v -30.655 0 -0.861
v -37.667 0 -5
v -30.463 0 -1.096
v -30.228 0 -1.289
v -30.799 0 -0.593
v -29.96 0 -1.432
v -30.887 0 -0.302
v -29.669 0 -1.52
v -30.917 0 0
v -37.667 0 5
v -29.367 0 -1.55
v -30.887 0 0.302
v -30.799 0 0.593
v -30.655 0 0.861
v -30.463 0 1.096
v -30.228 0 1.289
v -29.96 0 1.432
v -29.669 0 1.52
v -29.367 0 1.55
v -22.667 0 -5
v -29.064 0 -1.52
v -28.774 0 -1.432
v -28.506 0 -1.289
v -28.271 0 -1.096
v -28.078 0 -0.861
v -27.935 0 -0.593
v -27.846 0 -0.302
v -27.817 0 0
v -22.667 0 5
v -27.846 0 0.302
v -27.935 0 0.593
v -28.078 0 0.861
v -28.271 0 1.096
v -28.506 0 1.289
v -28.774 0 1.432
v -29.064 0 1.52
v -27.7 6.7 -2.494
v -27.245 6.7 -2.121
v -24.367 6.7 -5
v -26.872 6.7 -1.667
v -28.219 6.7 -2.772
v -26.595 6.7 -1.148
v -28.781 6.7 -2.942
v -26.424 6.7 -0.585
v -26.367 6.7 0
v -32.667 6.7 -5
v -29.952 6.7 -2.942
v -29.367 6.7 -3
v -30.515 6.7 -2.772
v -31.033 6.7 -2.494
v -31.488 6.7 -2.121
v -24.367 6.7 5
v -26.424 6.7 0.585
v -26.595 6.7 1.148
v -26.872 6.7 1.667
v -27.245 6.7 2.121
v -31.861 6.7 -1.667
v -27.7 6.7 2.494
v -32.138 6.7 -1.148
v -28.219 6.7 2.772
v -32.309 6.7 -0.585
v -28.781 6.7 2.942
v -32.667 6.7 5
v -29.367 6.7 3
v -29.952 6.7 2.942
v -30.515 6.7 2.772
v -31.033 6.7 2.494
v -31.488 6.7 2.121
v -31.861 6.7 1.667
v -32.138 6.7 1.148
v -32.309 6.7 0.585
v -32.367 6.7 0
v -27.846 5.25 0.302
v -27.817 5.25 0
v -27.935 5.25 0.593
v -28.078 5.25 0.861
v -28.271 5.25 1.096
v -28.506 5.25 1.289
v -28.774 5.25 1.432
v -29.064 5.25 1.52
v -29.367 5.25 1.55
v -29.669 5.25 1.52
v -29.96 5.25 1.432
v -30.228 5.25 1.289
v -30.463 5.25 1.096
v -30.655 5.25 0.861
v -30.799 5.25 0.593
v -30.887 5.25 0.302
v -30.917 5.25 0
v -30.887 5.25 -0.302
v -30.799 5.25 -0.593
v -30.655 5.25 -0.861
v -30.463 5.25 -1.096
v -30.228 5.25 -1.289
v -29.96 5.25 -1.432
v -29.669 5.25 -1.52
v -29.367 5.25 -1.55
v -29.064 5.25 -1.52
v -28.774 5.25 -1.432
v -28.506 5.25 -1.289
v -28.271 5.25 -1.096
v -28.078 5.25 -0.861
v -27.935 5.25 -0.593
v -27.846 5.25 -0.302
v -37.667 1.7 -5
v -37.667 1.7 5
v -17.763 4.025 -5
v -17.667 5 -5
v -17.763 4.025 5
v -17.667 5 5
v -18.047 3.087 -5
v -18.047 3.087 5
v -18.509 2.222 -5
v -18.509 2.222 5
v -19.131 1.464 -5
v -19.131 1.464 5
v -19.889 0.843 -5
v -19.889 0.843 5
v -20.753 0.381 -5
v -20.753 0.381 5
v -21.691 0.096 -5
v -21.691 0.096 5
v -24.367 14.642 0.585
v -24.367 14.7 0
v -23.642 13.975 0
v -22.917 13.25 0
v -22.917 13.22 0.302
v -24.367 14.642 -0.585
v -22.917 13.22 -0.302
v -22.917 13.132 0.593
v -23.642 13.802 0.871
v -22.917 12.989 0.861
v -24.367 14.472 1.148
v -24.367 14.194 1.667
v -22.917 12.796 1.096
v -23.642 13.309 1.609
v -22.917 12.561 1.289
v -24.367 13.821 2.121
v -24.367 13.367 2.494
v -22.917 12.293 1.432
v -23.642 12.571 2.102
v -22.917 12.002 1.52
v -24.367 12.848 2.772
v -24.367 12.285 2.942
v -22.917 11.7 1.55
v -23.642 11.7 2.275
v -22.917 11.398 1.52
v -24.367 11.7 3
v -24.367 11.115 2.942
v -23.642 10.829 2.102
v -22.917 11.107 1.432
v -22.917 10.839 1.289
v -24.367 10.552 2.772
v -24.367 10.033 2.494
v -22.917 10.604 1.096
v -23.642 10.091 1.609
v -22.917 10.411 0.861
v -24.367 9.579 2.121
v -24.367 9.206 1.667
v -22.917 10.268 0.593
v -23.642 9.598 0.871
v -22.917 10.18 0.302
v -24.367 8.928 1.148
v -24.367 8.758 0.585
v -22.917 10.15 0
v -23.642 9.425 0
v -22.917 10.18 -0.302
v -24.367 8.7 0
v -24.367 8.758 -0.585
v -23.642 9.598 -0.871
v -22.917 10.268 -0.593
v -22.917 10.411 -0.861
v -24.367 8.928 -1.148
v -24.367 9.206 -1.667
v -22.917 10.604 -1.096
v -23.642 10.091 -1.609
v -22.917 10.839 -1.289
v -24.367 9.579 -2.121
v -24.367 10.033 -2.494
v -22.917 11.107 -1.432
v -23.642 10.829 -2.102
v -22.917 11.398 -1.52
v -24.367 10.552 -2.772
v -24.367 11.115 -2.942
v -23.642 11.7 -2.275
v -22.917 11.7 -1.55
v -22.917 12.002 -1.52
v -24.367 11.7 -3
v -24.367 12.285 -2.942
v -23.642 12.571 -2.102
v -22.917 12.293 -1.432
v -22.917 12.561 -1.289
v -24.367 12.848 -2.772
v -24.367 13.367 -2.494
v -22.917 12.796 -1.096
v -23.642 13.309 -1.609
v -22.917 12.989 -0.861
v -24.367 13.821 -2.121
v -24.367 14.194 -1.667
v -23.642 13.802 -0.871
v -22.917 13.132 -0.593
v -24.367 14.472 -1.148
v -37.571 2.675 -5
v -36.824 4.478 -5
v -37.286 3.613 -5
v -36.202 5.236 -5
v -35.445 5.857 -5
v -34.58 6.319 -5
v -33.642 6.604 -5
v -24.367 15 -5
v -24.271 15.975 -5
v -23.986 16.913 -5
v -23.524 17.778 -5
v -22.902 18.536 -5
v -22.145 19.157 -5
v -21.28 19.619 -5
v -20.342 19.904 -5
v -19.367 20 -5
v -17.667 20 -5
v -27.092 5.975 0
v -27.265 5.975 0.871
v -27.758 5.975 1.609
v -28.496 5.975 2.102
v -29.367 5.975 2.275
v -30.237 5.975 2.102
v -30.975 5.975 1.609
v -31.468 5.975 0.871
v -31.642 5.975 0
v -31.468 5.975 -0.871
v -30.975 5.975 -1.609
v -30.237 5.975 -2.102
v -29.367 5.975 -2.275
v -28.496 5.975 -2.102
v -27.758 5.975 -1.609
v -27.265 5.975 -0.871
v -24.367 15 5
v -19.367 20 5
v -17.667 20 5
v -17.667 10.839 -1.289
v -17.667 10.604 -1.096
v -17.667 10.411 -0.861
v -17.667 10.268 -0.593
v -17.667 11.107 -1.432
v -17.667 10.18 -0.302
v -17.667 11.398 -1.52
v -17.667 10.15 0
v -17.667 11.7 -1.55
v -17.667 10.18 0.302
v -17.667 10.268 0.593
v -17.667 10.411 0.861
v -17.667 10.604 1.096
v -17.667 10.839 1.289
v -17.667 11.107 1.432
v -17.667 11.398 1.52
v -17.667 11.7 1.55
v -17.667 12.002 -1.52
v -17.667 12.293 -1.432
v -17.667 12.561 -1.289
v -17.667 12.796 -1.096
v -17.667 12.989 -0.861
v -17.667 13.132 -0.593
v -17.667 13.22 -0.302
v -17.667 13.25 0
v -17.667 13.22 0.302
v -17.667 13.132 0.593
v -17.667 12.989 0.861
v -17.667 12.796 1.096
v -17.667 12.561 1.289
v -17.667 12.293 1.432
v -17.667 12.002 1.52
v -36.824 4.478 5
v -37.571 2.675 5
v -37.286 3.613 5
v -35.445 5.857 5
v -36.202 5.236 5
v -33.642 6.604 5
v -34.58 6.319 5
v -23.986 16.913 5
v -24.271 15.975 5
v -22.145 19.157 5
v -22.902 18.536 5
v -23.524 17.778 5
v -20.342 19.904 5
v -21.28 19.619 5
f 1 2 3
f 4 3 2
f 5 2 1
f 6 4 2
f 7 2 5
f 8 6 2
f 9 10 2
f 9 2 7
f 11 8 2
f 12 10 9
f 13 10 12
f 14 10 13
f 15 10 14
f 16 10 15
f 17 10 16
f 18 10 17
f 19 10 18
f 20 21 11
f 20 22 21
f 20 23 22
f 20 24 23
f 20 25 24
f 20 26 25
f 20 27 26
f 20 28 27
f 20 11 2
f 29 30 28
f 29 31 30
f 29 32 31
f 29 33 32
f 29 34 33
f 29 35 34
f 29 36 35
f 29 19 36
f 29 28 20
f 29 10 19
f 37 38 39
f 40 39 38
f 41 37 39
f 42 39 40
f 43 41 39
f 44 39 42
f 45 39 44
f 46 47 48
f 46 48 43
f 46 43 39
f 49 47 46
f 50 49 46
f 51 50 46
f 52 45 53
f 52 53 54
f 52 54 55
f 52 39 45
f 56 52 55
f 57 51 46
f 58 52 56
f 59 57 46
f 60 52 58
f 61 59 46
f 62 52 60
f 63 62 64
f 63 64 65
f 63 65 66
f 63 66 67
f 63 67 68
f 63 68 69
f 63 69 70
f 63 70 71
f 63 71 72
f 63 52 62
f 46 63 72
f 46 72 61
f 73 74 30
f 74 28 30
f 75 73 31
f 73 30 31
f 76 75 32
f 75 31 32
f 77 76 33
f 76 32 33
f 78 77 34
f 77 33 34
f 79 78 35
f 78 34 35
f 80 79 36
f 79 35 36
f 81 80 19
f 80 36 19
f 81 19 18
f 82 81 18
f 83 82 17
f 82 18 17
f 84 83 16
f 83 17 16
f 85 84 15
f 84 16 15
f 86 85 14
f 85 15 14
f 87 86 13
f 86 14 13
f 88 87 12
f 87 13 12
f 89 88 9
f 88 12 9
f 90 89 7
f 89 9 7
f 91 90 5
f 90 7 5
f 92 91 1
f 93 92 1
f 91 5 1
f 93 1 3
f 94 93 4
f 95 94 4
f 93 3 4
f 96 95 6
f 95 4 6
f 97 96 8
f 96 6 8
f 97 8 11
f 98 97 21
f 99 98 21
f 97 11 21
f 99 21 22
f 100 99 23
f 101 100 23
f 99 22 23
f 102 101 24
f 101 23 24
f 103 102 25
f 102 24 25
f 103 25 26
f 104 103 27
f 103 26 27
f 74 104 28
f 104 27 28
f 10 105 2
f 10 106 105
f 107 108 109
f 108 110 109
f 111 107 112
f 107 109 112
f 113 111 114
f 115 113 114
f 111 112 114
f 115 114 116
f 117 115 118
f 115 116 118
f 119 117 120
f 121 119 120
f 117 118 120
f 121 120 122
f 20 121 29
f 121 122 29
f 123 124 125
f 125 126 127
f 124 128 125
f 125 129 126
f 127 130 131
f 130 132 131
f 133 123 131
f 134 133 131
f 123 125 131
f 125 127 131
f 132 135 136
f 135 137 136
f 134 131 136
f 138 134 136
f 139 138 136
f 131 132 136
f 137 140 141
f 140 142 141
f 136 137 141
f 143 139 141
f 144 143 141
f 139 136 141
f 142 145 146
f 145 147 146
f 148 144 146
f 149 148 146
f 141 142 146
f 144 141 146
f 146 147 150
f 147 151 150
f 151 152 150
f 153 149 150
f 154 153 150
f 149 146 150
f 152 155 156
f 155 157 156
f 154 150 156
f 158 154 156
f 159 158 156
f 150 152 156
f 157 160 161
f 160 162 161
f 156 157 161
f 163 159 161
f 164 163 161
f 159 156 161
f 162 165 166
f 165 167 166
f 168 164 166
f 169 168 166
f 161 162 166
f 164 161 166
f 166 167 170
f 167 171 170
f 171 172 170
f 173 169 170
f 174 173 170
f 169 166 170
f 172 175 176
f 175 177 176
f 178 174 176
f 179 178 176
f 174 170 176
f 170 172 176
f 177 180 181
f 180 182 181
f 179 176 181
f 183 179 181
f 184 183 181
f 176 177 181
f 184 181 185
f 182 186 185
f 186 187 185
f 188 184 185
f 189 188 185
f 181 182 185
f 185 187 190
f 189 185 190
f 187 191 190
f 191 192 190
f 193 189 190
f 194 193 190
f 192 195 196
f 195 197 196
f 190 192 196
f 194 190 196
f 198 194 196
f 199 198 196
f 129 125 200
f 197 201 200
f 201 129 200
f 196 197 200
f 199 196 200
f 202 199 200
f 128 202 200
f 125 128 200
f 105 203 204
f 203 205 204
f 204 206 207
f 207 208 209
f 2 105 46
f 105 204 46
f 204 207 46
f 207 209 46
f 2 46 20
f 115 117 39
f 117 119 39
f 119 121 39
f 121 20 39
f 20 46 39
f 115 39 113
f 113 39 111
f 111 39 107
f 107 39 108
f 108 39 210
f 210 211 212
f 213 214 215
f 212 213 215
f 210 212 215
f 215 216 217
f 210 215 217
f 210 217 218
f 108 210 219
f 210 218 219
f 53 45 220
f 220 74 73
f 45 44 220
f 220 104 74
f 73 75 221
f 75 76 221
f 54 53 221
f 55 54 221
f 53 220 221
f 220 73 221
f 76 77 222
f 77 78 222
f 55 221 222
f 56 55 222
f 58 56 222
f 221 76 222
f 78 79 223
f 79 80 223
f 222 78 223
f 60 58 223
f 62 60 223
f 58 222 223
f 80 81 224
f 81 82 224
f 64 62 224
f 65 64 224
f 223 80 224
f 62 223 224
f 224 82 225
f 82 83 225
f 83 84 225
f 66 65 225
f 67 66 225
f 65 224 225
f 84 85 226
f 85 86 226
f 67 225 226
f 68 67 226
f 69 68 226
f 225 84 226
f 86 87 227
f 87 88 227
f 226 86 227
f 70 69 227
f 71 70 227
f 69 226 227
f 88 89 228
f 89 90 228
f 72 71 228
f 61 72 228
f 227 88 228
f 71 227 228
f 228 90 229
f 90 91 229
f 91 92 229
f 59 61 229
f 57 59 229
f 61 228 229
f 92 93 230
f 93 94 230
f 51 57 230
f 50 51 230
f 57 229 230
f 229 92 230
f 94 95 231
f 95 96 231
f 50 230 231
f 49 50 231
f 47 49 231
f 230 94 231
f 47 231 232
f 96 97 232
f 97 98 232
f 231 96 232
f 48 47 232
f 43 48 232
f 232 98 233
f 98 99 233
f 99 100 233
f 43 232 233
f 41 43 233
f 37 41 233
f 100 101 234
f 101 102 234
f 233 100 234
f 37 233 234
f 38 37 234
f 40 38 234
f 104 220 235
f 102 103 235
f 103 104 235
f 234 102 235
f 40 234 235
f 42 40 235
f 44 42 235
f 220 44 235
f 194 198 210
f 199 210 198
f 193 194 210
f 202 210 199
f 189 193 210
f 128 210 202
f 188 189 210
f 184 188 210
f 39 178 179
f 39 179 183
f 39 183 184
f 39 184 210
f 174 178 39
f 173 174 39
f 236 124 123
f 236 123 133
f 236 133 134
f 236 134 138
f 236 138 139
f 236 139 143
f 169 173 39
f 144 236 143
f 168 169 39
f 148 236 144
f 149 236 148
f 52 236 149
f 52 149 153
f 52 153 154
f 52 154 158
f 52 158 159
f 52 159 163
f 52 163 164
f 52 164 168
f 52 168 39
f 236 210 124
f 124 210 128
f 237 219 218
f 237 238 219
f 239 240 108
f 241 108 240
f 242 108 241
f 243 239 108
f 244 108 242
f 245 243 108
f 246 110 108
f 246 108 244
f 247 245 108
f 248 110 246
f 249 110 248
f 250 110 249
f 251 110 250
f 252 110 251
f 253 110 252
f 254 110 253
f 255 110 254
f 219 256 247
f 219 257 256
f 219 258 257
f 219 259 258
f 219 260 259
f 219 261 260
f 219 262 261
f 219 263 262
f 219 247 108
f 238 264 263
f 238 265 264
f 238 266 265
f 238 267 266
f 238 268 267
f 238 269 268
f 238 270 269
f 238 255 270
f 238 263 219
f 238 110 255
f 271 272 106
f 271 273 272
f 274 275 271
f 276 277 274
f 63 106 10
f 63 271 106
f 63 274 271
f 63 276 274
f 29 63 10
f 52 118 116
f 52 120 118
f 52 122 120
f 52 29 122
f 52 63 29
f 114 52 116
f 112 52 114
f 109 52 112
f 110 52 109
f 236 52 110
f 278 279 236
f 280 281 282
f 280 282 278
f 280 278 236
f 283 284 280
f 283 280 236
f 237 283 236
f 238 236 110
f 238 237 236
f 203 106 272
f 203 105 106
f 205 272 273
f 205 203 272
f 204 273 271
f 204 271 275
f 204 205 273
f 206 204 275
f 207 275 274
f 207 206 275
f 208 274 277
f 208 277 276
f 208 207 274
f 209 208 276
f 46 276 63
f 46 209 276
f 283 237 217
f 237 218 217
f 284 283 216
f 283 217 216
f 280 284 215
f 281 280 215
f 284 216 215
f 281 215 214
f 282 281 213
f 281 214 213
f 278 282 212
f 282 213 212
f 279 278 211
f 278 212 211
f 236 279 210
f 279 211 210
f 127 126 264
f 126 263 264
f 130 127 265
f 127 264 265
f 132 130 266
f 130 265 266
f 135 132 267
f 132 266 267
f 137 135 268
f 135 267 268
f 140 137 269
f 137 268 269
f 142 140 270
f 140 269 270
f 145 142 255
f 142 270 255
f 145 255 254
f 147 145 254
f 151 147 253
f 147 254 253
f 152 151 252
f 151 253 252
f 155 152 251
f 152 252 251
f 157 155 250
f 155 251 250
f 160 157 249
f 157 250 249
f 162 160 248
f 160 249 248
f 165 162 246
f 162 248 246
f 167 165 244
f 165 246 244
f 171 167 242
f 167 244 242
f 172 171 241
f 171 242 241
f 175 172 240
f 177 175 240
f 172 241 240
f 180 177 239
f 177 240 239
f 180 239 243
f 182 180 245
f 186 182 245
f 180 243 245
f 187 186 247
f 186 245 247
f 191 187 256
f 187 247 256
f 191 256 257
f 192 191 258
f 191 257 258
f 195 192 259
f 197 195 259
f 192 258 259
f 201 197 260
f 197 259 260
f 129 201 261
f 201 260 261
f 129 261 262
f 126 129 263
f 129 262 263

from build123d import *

# Parameters (mm, degrees)
F1_DEPTH       = 5
F4_D           = 3.1
F4_CSINK_D     = 6
F4_CSINK_ANGLE = 90
F5_D           = 3.1
F5_CSINK_D     = 6
F5_CSINK_ANGLE = 90
F6_R           = 5
F7_R           = 5


with BuildPart() as f1:
    # F0 (on Top) → F1 (new body, symmetric)
    with BuildSketch(Plane.XY):
        Polygon((-37.666672, 6.7), (-37.666672, 0), (-17.666672, 0), (-17.666672, 20.000001), (-24.366672, 20), (-24.366672, 6.7), align=None)
    extrude(amount=F1_DEPTH, both=True)

    # F4 (through all)
    with Locations(Plane(origin=(-24.366672, 0, 0), x_dir=(0, -1, 0), z_dir=(-1, 0, 0))):
        with Locations((-11.7, 0)):
            CounterSinkHole(F4_D / 2, F4_CSINK_D / 2, counter_sink_angle=F4_CSINK_ANGLE)

    # F5 (through all)
    with Locations(Plane(origin=(0, 6.7, 0), x_dir=(-1, 0, 0), z_dir=(0, 1, 0))):
        with Locations((29.366672, 0)):
            CounterSinkHole(F5_D / 2, F5_CSINK_D / 2, counter_sink_angle=F5_CSINK_ANGLE)

    # F6
    f6_edges = [f1.edges().sort_by_distance(p)[0] for p in [
        (-17.666672, 0, 0),
    ]]
    fillet(f6_edges, radius=F6_R)

    # F7
    f7_edges = [f1.edges().sort_by_distance(p)[0] for p in [
        (-24.366672, 20, 0),
        (-37.666672, 6.7, 0),
    ]]
    fillet(f7_edges, radius=F7_R)


solid = f1.part
